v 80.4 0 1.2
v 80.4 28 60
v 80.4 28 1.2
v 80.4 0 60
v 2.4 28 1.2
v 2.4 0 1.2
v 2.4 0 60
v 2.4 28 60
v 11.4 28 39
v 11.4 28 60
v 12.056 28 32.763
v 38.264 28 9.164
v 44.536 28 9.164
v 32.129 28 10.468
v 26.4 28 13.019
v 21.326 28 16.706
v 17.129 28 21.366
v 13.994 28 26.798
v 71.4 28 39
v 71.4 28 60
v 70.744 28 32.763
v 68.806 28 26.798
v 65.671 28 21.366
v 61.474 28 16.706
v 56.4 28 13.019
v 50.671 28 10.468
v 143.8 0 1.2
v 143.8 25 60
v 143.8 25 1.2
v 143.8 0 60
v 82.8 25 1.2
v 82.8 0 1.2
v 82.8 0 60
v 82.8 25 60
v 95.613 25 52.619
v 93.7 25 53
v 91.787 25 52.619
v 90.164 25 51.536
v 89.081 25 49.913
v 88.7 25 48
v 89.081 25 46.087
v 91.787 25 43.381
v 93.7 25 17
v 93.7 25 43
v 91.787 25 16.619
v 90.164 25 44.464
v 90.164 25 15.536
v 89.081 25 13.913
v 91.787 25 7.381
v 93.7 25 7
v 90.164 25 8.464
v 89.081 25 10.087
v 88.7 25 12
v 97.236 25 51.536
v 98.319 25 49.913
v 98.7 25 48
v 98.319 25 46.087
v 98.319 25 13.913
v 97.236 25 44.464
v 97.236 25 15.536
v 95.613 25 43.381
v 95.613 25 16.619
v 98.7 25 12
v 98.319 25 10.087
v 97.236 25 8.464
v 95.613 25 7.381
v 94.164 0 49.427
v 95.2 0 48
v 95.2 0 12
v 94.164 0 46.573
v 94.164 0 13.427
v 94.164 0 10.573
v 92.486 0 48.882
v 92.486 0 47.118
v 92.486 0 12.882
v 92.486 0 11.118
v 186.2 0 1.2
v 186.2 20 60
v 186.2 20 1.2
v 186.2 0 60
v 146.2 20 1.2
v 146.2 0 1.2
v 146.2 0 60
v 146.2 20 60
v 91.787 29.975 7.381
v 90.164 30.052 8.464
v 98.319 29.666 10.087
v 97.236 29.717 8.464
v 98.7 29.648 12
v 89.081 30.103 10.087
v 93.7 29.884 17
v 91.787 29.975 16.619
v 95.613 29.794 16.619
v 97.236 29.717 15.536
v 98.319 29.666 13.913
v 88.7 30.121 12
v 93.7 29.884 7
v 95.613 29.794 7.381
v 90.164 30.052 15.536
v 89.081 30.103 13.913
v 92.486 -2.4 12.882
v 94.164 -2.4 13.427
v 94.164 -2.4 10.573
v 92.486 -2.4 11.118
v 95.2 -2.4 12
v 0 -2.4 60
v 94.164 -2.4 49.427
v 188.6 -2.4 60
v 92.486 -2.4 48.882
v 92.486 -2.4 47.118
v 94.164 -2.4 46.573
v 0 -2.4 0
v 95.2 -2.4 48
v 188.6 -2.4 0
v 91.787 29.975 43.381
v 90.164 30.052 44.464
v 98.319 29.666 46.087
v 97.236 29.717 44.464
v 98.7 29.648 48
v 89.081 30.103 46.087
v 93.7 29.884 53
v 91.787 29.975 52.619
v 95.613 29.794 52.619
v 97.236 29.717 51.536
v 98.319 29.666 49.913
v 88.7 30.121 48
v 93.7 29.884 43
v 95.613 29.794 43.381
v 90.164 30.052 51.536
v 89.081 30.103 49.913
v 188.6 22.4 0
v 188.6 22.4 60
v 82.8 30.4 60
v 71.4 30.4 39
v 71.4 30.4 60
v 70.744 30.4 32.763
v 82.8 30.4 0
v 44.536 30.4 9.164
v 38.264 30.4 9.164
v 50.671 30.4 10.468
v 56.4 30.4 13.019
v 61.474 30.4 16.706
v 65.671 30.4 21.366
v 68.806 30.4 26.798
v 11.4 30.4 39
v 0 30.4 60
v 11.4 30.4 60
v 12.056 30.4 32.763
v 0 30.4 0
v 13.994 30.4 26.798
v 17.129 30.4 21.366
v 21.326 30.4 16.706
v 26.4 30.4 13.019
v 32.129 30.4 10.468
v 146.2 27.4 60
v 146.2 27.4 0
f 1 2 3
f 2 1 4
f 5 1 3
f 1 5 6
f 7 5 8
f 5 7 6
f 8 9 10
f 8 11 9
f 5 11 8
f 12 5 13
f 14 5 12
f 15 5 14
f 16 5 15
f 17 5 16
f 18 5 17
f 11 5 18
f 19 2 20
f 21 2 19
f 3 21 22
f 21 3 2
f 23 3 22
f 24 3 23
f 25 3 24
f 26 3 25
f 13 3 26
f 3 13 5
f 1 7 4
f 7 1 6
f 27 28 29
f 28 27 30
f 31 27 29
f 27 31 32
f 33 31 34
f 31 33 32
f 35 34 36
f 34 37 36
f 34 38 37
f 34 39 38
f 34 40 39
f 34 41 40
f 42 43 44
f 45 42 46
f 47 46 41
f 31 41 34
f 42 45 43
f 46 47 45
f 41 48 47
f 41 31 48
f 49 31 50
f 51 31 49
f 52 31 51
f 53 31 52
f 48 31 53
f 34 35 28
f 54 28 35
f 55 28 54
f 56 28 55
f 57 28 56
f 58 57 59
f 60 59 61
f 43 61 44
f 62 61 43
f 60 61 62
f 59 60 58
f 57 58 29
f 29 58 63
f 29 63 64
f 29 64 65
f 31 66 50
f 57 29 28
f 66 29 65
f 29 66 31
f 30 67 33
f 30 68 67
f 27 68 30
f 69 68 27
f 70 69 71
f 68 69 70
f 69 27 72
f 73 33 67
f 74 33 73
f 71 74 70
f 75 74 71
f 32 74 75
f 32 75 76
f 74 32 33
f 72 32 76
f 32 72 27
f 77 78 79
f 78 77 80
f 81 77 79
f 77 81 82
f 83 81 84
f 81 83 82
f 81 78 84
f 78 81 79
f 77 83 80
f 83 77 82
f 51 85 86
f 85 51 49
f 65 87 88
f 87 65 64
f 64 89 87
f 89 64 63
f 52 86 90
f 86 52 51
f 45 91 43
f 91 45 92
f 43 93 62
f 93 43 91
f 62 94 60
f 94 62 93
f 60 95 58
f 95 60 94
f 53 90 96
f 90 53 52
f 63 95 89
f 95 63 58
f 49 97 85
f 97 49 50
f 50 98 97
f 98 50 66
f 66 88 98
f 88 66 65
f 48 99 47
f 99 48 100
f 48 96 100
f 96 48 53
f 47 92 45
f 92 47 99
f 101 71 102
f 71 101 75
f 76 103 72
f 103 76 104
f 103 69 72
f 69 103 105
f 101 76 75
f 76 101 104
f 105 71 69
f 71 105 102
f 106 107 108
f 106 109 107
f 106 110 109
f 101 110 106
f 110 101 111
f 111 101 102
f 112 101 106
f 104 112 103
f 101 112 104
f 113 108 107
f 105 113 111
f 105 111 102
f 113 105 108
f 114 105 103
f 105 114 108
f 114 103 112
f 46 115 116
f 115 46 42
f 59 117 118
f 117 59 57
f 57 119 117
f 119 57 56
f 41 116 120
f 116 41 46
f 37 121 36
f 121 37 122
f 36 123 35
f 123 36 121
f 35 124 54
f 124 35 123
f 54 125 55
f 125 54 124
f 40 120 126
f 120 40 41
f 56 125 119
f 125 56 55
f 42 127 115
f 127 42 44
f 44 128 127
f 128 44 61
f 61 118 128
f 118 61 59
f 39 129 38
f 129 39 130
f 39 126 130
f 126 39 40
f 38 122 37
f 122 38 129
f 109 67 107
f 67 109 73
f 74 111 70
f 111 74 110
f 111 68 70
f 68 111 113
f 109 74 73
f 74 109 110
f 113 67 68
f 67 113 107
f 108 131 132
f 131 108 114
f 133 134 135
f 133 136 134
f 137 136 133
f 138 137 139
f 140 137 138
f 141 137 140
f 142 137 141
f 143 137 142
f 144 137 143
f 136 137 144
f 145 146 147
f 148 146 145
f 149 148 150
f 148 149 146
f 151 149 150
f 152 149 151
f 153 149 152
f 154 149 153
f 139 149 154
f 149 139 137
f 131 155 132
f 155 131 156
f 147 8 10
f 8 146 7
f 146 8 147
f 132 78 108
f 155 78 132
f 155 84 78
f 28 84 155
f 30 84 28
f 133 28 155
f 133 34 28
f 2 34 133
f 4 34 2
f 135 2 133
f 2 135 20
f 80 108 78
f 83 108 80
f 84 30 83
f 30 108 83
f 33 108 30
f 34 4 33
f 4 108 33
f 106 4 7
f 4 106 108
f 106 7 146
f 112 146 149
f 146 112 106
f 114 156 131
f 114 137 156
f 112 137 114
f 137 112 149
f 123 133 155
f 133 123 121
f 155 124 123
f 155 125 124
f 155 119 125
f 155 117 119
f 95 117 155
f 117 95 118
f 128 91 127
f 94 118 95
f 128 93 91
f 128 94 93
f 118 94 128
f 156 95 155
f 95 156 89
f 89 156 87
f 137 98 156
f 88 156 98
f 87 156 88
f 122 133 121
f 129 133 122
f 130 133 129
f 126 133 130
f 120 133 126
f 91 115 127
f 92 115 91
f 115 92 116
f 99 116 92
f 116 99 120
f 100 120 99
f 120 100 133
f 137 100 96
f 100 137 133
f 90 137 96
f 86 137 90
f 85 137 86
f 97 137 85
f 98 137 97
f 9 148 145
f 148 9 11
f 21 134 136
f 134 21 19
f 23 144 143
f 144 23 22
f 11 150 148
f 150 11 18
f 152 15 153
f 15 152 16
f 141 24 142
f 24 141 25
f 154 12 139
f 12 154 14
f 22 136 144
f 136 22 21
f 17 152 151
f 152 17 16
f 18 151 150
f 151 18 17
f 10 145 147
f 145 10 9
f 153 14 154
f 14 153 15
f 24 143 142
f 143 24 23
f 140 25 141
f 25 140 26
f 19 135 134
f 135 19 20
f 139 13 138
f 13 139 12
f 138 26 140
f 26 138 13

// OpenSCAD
z = 90;

//remotes
boxes = [
    [57, 30], // projector
];
z = 80;

// whal peanut electric razor
boxes = [
    [7],       // brush
    [21],       // oil
    [38, 24],   // s4
    [38, 20],   // s3
    [38, 16],   // s2
    [38, 12],   // s1
];
z = 32;

//bathroom holder
boxes = [
    [21], // marker
    [32.5], // flonaise
    [10, 36], // comb
    [55, 30], // toothpaste
    [25], // toothbrush 
    [25], // toothbrush
];

boxes = [
    [194, 26],
    [93, 18], // keyboard thing
];
z = 140;
edge = 10;

button_outside_d=78;
button_h=28;

//mice
boxes = [
    [78, 28], // echo botton
    [61, 25], // denon
    [40, 20], // fire TV
];

z = 60;

button_d=60;



function my_sum(i, total=0) =
    i==0 ?
        total + boxes[0][0] :
        my_sum(i - 1, total + boxes[i][0]);

module all_shapes(move=0, grow=0) {
    for (n = [0:len(boxes)-1]) {
        if (boxes[n][1] == undef) {
            translate([my_sum(n)-boxes[n][0]/2+n*move+move,boxes[n][0]/2,0])
            cylinder(d=boxes[n][0]+grow*2, h=z);
        } else {
            translate([my_sum(n)-boxes[n][0]-grow+n*move+move,-grow,0])
            cube([boxes[n][0]+grow*2, boxes[n][1]+grow*2, boxes[n][2] != undef ? boxes[n][2] : z]);
        }
    }
}

// i3
wall=0.35;
// rostock
wall=1.2;
screw=3;
head=10;
screw_offset=z/5;

module assembled() {
    difference() {
        hull()
        all_shapes(wall*2, wall*2);
        translate([0,0,wall])
        all_shapes(wall*2, 0);
        for (n = [screw_offset, z-screw_offset]) {
            translate([(my_sum(len(boxes)-1)+wall*2*len(boxes)+wall)/2,0,n])
            rotate([-90,0,0]) {
                cylinder(d=head,h=100);
                translate([0,0,-wall*2])
                cylinder(d=screw,h=100);
            }
        }
        translate([button_outside_d/2+wall*2,button_h+wall*3,button_outside_d/2])

        rotate([90,0,0])
        hull() {
            cylinder(d=button_d,h=wall*4);
            translate([0,button_d,0])
            cylinder(d=button_d,h=wall*4);
        }
    }
}

module fine() {
    $fn=200;
    assembled();
}

display="";
if (display == "") assembled();
if (display == "bathroom_holder.stl") fine();
